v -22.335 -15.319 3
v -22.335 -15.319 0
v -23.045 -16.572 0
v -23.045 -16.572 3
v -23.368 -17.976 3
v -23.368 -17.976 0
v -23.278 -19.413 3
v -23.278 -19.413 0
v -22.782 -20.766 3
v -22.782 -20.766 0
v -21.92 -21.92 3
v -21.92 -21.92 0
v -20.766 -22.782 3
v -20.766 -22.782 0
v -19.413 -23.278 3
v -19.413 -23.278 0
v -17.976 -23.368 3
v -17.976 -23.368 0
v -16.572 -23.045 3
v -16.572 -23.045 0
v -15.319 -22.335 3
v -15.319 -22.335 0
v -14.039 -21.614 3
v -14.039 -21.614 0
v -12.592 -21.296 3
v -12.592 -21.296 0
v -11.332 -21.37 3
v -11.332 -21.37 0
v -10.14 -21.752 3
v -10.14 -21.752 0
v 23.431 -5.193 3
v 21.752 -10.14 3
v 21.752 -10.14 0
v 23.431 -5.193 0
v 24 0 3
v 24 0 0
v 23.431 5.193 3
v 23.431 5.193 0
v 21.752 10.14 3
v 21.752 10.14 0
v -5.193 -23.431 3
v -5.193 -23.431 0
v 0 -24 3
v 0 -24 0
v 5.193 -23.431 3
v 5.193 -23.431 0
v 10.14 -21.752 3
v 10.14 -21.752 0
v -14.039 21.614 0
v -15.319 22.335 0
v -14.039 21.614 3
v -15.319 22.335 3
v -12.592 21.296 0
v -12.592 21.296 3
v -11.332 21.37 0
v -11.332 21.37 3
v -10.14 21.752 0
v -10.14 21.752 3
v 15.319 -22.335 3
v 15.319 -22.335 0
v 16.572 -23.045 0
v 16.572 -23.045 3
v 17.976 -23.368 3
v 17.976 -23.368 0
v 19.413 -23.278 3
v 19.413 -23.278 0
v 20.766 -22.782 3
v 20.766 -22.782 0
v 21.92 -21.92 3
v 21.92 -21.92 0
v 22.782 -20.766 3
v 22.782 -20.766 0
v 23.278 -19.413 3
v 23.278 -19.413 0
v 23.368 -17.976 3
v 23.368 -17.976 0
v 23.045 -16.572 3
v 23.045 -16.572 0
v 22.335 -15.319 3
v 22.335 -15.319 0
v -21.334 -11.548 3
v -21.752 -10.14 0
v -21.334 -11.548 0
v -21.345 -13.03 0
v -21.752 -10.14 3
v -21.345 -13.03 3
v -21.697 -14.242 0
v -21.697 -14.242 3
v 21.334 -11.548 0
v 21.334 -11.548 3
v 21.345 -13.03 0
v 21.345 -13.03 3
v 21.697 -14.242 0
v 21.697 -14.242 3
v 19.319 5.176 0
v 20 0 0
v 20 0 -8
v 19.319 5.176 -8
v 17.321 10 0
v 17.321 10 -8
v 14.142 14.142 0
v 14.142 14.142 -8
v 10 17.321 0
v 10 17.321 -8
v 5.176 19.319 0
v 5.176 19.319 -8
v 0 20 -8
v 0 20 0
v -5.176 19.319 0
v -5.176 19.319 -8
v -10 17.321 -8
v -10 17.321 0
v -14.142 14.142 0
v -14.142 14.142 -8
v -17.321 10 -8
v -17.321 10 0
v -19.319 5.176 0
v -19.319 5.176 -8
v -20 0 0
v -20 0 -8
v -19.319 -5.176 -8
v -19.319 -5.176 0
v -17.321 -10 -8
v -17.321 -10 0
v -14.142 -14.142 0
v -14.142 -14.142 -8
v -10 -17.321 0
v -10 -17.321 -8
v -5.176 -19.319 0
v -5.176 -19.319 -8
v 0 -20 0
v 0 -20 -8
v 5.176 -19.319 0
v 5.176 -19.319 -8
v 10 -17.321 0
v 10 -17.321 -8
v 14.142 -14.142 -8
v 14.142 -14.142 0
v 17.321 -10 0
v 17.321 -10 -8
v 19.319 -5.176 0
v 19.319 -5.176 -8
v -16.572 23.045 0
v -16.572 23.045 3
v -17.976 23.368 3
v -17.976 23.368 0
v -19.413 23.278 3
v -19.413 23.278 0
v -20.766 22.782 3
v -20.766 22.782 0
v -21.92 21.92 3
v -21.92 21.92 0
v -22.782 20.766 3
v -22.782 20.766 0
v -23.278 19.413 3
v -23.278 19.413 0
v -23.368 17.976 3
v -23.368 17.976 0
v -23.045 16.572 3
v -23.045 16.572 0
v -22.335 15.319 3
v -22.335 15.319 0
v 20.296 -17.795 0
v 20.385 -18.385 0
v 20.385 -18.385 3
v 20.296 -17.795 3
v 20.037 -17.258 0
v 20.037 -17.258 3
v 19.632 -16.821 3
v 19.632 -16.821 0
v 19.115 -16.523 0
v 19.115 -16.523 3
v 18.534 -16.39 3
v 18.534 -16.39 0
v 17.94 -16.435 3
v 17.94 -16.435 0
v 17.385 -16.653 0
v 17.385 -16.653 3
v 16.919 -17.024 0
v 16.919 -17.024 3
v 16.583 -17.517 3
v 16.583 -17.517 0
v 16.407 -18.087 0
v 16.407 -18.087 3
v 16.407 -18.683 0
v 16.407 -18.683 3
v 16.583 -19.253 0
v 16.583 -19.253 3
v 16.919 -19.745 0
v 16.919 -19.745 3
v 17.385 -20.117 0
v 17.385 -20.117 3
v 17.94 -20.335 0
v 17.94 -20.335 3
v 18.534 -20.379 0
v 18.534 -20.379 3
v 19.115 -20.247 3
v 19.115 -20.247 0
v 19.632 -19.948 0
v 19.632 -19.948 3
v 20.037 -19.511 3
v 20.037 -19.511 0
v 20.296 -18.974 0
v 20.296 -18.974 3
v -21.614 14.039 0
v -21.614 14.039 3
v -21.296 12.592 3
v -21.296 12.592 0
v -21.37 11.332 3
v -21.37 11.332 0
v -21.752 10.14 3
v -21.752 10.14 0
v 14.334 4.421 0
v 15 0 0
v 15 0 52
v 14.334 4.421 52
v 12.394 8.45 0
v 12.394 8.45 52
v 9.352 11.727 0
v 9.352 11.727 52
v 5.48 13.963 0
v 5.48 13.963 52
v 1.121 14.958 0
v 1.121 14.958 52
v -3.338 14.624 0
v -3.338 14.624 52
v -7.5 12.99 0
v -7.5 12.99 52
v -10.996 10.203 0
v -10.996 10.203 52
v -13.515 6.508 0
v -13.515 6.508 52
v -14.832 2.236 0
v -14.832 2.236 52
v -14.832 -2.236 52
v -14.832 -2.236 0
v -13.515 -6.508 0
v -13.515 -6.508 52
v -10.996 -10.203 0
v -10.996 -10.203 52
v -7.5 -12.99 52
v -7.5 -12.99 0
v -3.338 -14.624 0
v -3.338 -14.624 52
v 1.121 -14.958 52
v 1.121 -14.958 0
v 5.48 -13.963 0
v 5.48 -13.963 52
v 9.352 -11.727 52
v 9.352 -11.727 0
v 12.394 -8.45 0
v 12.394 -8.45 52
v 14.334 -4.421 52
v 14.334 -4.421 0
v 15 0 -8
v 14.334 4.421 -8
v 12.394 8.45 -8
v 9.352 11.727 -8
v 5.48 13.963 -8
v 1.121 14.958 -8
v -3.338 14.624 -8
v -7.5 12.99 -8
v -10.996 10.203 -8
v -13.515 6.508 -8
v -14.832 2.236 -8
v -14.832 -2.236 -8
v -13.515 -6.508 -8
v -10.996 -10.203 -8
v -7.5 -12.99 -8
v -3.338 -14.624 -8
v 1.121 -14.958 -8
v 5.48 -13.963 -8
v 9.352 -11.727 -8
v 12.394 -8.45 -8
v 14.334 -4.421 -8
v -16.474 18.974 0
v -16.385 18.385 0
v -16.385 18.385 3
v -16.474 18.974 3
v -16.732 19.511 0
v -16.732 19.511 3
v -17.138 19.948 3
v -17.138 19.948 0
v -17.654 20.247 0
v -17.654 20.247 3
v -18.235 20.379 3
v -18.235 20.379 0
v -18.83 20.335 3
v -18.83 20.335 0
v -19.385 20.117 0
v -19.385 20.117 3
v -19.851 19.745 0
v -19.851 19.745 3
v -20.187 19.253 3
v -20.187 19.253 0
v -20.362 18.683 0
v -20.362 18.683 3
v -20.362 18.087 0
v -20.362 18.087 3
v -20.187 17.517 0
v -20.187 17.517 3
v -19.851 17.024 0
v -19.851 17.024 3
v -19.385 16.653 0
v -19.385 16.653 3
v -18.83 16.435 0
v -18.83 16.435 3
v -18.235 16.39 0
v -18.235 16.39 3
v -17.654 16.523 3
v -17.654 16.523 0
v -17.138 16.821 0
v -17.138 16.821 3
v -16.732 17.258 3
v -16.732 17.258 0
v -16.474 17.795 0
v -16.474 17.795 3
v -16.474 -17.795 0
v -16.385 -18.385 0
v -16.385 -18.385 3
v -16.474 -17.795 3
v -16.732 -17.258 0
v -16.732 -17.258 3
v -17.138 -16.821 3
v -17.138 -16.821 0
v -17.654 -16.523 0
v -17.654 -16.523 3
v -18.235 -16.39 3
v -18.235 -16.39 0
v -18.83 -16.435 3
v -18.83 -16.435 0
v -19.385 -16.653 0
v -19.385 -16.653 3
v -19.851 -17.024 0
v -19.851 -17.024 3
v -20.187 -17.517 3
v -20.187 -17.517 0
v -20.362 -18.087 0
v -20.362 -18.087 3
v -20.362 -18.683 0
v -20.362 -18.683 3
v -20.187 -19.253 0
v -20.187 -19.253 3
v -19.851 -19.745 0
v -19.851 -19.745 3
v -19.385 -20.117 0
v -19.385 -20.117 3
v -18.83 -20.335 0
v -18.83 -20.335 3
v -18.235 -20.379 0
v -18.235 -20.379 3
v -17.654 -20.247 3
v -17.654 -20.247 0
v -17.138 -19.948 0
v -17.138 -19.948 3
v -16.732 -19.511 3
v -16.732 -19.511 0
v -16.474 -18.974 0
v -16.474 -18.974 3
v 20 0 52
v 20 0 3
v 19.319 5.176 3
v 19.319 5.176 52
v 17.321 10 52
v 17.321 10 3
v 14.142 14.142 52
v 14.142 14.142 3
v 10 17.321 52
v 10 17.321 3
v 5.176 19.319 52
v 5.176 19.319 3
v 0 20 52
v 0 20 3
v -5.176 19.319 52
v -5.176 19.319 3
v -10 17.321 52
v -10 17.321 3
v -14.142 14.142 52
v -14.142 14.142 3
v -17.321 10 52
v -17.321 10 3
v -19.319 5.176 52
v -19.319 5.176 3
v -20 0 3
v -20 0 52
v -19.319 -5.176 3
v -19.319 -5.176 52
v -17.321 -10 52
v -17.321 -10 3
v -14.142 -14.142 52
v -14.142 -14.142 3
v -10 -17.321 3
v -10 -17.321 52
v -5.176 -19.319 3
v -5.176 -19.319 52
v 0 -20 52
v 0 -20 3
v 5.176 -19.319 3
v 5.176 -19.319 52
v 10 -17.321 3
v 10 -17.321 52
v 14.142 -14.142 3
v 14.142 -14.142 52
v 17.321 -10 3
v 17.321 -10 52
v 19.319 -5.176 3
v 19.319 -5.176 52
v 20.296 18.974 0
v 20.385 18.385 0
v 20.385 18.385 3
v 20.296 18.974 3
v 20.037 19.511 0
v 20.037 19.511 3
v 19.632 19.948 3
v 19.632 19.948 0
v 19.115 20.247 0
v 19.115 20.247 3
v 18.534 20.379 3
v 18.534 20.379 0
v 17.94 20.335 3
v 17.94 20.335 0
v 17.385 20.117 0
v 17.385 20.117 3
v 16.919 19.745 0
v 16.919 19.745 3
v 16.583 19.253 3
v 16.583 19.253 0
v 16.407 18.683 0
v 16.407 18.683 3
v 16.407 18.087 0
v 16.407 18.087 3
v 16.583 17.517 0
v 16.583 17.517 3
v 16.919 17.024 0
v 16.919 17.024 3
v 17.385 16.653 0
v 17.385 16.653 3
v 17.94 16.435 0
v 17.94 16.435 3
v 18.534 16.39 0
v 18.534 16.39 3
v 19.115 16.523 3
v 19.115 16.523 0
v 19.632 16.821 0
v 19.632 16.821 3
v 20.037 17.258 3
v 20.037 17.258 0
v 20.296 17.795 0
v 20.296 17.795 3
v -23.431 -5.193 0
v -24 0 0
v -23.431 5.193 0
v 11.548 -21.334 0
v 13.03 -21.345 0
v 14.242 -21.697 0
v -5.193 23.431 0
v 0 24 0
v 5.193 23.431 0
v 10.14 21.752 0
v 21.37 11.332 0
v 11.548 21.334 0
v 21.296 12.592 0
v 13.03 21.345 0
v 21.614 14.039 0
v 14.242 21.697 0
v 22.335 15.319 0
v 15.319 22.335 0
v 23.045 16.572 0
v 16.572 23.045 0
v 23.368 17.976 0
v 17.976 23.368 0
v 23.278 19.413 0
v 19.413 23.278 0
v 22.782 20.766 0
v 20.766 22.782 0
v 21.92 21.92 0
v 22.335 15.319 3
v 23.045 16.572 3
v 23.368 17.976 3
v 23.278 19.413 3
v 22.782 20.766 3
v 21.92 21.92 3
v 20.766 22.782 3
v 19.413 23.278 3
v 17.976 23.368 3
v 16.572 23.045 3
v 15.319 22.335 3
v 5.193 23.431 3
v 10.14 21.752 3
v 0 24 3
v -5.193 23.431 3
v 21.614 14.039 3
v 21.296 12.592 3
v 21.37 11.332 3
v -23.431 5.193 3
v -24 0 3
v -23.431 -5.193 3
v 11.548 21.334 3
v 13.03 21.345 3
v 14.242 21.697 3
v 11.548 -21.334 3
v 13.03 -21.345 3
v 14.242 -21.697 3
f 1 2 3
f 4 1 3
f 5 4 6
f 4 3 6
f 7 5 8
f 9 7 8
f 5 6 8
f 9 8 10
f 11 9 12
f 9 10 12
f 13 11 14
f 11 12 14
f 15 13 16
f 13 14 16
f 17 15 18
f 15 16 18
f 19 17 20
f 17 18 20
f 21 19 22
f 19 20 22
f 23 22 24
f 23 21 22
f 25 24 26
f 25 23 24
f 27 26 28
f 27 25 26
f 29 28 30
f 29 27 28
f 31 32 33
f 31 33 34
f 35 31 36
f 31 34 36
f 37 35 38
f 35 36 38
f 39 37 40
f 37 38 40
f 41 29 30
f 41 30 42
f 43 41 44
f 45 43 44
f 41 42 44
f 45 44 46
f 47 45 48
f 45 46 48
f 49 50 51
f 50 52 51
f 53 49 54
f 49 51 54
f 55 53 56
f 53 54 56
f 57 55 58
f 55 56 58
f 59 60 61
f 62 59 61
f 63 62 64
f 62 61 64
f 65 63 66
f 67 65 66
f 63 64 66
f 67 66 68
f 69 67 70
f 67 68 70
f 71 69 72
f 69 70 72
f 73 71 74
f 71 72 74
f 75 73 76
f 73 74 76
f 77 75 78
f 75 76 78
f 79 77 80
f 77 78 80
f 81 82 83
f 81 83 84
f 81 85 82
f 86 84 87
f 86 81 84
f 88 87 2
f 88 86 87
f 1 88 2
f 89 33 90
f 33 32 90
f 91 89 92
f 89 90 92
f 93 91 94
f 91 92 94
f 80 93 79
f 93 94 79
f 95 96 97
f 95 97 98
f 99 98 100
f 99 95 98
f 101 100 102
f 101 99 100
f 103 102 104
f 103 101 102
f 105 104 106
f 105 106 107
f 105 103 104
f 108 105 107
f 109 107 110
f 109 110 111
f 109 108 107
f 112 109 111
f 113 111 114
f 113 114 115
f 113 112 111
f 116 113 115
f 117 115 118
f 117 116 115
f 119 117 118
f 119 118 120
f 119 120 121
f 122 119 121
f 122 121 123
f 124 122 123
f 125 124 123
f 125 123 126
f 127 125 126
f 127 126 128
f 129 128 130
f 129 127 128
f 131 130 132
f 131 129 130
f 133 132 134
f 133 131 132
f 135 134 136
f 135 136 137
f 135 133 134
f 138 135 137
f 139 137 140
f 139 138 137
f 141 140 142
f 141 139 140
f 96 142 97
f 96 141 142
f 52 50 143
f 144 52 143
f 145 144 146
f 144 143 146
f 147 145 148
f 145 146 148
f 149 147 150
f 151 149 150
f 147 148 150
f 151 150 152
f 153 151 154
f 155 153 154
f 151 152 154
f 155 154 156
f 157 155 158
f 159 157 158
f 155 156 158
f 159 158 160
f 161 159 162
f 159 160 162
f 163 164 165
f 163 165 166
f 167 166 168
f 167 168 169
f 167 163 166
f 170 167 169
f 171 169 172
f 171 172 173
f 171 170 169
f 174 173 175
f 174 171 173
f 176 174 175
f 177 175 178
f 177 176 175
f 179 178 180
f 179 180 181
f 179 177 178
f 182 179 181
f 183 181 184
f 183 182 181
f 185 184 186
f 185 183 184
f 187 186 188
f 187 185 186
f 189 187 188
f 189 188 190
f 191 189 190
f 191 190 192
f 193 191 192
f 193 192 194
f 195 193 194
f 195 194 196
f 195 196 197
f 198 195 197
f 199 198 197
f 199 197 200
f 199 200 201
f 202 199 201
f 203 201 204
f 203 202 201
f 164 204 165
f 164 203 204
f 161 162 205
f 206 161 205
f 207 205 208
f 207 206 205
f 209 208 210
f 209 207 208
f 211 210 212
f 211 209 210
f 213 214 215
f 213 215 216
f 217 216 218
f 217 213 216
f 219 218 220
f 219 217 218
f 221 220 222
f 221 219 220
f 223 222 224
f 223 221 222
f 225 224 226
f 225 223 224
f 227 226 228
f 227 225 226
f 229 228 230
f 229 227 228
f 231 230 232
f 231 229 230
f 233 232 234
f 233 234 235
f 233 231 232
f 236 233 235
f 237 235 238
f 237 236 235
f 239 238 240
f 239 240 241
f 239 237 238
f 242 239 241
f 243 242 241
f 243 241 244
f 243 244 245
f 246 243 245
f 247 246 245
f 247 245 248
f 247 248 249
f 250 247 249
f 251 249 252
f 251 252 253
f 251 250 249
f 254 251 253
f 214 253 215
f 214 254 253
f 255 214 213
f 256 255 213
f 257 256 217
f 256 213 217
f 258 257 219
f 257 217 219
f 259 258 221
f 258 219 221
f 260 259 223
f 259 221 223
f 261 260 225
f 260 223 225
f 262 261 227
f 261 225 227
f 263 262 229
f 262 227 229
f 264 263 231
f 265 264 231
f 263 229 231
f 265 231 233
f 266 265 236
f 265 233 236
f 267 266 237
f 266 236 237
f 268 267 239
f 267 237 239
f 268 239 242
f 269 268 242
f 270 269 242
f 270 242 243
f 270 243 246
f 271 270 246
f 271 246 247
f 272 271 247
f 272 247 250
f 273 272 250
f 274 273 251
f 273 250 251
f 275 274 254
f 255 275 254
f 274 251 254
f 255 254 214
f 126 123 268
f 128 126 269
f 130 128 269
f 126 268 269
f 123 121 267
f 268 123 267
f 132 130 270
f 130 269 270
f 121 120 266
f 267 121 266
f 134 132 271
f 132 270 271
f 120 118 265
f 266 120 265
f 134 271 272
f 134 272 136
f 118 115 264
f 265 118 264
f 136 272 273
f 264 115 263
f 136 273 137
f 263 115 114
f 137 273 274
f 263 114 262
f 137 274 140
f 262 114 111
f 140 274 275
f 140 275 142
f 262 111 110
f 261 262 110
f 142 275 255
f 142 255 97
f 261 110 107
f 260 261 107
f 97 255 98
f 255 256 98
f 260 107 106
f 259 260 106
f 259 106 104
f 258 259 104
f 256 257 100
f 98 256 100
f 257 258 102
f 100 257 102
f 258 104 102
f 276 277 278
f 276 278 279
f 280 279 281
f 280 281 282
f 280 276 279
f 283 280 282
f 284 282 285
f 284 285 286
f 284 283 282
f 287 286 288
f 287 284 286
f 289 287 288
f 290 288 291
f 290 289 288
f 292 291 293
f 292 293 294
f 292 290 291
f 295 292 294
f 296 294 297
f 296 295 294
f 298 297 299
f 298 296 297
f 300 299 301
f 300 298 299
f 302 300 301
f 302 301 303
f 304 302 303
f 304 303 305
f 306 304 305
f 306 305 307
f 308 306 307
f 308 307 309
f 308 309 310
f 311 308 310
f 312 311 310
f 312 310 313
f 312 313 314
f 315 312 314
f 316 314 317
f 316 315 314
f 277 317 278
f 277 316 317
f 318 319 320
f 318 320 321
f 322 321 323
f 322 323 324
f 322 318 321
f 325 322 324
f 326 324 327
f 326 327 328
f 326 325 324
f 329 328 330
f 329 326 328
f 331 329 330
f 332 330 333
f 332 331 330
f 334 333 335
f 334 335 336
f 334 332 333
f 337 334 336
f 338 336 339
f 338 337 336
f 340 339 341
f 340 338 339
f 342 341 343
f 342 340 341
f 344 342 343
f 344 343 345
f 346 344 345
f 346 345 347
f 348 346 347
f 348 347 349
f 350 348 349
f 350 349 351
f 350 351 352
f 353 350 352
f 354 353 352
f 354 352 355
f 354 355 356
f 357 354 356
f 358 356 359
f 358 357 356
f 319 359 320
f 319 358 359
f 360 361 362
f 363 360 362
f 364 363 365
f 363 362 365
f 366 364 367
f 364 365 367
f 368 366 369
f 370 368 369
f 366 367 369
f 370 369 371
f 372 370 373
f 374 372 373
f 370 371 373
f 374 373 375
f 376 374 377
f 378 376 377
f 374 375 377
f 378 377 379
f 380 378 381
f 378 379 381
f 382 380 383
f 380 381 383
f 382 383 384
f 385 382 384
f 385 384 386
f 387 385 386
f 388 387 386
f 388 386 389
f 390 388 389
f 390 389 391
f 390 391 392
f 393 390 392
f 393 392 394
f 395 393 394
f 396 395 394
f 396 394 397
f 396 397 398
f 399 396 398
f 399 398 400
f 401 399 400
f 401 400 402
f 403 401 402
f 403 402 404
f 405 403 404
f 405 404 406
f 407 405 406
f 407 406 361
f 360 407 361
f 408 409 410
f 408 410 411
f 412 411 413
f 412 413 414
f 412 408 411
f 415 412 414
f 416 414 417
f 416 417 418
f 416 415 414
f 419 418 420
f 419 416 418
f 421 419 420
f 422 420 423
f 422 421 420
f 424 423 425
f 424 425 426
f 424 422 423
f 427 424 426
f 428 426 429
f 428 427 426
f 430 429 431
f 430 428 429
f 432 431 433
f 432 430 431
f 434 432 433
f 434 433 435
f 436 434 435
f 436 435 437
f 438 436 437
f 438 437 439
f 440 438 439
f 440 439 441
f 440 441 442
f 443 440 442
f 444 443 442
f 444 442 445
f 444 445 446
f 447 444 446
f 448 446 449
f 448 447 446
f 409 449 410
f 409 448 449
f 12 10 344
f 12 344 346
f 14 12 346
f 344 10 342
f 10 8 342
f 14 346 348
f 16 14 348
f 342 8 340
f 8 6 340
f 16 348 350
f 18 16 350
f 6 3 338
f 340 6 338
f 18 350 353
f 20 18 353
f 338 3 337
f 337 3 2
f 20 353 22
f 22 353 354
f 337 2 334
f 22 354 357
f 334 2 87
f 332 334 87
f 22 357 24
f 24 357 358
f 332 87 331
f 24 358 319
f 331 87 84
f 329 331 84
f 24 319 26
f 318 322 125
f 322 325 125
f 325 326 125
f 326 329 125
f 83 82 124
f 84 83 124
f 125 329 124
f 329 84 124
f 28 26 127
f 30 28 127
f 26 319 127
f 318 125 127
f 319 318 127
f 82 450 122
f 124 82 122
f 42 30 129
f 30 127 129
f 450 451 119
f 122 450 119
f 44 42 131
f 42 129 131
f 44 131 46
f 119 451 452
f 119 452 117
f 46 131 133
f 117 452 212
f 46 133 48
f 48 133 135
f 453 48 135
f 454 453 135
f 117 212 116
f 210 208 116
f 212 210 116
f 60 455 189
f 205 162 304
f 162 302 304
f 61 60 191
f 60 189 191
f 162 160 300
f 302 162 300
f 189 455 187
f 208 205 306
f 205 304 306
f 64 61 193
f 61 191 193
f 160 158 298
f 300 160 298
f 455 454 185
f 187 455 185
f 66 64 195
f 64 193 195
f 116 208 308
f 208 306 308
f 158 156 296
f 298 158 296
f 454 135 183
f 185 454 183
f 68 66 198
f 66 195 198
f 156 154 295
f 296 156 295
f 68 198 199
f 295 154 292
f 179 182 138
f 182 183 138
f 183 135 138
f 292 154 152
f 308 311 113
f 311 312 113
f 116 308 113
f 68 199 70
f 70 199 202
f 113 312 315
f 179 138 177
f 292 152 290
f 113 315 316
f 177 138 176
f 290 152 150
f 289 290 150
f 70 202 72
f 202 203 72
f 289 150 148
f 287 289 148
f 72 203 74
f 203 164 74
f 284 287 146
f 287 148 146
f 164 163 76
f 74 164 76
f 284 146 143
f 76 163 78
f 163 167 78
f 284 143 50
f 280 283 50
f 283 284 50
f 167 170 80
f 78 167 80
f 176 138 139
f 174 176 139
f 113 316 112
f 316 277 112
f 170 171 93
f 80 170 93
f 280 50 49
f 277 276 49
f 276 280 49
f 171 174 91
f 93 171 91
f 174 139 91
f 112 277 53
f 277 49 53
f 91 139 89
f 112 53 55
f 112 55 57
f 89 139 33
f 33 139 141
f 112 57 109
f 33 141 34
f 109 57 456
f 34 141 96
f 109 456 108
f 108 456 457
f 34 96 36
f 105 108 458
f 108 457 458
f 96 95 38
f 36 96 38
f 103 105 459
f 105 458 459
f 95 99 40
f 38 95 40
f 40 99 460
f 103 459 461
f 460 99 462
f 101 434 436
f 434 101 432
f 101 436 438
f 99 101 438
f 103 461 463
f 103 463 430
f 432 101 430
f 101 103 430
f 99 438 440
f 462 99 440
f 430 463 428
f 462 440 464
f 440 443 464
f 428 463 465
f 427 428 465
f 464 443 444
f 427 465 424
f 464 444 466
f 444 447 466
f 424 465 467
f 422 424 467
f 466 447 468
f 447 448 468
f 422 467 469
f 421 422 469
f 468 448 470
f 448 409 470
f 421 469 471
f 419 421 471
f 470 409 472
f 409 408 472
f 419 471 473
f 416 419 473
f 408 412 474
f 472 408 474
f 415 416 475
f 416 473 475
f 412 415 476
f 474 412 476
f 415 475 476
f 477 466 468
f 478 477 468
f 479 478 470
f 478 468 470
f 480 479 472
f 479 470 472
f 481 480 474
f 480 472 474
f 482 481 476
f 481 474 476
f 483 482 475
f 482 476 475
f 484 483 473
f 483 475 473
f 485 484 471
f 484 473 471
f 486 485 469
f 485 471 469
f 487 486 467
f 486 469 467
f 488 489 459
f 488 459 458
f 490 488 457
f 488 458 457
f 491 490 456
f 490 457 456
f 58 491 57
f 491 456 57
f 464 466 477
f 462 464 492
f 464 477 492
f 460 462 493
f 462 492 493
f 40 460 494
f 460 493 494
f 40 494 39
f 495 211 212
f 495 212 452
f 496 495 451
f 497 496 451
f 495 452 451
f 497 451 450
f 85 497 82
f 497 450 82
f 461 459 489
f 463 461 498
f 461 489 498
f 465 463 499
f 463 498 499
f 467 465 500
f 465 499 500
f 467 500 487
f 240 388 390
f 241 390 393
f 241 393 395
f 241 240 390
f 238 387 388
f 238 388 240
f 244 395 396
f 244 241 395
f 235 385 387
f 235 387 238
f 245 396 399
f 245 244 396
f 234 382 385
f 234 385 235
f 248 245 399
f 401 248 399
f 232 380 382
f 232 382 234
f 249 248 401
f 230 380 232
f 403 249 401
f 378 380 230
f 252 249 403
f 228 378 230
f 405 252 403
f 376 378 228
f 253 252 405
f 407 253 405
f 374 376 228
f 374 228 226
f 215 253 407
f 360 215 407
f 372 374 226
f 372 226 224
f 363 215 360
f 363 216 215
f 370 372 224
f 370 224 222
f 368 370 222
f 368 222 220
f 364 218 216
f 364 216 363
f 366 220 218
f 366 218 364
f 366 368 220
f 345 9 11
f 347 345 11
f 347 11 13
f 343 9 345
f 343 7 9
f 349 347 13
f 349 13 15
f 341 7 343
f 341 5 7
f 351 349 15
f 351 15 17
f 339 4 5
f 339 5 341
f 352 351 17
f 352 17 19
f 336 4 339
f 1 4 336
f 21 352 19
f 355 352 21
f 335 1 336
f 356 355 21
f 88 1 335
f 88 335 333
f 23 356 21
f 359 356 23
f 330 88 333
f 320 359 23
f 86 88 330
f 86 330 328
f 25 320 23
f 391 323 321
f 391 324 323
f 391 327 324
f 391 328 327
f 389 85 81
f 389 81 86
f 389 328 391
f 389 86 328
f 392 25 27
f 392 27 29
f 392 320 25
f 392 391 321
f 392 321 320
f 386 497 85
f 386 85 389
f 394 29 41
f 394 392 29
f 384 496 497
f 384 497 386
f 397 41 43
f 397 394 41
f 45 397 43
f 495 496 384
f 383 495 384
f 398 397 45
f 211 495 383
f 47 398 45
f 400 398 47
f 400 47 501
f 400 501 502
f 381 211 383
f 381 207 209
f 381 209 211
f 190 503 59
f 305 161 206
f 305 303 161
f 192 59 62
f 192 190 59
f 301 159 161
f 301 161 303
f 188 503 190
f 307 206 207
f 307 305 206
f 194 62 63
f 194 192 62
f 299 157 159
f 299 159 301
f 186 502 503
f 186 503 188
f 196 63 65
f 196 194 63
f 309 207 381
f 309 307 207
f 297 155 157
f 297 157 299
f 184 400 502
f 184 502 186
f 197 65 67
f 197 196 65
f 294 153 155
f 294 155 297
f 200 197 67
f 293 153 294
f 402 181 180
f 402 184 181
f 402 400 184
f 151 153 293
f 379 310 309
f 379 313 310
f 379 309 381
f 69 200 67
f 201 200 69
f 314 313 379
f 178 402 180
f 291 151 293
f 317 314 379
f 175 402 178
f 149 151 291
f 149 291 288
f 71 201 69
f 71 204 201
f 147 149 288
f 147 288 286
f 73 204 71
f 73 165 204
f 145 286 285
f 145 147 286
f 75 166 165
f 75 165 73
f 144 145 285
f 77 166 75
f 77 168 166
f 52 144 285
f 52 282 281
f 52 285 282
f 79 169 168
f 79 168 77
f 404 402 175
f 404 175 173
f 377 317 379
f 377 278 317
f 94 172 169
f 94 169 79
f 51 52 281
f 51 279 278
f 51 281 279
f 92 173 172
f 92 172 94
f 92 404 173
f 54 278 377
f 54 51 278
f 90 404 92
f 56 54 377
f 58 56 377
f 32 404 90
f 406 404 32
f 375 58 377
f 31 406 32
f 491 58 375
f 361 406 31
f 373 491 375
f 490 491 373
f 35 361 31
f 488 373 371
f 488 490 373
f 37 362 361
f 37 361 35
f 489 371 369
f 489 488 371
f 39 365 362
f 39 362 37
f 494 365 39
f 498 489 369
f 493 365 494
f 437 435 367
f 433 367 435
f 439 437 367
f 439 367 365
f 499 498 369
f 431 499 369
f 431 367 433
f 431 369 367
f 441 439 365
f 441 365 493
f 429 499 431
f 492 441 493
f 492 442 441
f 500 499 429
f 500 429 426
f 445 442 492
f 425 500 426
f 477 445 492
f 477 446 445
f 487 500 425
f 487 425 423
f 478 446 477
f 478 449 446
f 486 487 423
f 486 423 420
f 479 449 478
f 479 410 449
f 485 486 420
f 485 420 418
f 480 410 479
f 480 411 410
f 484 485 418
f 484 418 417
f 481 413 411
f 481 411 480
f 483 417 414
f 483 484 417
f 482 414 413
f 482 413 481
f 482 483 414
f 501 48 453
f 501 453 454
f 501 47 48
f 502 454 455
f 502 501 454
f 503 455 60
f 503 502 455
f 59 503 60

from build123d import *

# Parameters (mm, degrees)
F0_R          = 2
F0_R_2        = 20
F1_DEPTH      = 3
F2_R          = 5
F3_R          = 20
F3_R_2        = 15
F4_DEPTH      = 52
F4_DEPTH_BACK = 8


with BuildPart() as f1:
    # F0 (on Top) → F1 (new body)
    with BuildSketch(Plane.XY):
        with BuildLine():
            ThreePointArc((-13.584878, 19.785123), (-21.92031, 21.92031), (-19.785123, 13.584878))
            ThreePointArc((-19.785123, 13.584878), (-24, 0), (-19.785123, -13.584878))
            ThreePointArc((-19.785123, -13.584878), (-21.92031, -21.92031), (-13.584878, -19.785123))
            ThreePointArc((-13.584878, -19.785123), (0, -24), (13.584878, -19.785123))
            ThreePointArc((13.584878, -19.785123), (21.92031, -21.92031), (19.785123, -13.584878))
            ThreePointArc((19.785123, -13.584878), (24, 0), (19.785123, 13.584878))
            ThreePointArc((19.785123, 13.584878), (21.92031, 21.92031), (13.584878, 19.785123))
            ThreePointArc((13.584878, 19.785123), (0, 24), (-13.584878, 19.785123))
        make_face()
        with Locations((-18.384776, -18.384776)):
            Circle(F0_R, mode=Mode.SUBTRACT)
        with Locations((18.384776, -18.384776)):
            Circle(F0_R, mode=Mode.SUBTRACT)
        with Locations((-18.384776, 18.384776)):
            Circle(F0_R, mode=Mode.SUBTRACT)
        Circle(F0_R_2, mode=Mode.SUBTRACT)
        with Locations((18.384776, 18.384776)):
            Circle(F0_R, mode=Mode.SUBTRACT)
    extrude(amount=F1_DEPTH)

    # F2
    f2_edges = [f1.edges().sort_by_distance(p)[0] for p in [
        (-13.584878, -19.785123, 1.5),
        (19.785123, 13.584878, 1.5),
        (-19.785123, 13.584878, 1.5),
        (-19.785123, -13.584878, 1.5),
        (19.785123, -13.584878, 1.5),
        (-13.584878, 19.785123, 1.5),
        (13.584878, -19.785123, 1.5),
        (13.584878, 19.785123, 1.5),
    ]]
    fillet(f2_edges, radius=F2_R)

    # F3 (on Top) → F4 (join, two sides)
    with BuildSketch(Plane.XY) as f4_sk:
        Circle(F3_R)
        Circle(F3_R_2, mode=Mode.SUBTRACT)
    extrude(amount=F4_DEPTH)
    extrude(f4_sk.sketch, amount=-F4_DEPTH_BACK)


solid = f1.part
